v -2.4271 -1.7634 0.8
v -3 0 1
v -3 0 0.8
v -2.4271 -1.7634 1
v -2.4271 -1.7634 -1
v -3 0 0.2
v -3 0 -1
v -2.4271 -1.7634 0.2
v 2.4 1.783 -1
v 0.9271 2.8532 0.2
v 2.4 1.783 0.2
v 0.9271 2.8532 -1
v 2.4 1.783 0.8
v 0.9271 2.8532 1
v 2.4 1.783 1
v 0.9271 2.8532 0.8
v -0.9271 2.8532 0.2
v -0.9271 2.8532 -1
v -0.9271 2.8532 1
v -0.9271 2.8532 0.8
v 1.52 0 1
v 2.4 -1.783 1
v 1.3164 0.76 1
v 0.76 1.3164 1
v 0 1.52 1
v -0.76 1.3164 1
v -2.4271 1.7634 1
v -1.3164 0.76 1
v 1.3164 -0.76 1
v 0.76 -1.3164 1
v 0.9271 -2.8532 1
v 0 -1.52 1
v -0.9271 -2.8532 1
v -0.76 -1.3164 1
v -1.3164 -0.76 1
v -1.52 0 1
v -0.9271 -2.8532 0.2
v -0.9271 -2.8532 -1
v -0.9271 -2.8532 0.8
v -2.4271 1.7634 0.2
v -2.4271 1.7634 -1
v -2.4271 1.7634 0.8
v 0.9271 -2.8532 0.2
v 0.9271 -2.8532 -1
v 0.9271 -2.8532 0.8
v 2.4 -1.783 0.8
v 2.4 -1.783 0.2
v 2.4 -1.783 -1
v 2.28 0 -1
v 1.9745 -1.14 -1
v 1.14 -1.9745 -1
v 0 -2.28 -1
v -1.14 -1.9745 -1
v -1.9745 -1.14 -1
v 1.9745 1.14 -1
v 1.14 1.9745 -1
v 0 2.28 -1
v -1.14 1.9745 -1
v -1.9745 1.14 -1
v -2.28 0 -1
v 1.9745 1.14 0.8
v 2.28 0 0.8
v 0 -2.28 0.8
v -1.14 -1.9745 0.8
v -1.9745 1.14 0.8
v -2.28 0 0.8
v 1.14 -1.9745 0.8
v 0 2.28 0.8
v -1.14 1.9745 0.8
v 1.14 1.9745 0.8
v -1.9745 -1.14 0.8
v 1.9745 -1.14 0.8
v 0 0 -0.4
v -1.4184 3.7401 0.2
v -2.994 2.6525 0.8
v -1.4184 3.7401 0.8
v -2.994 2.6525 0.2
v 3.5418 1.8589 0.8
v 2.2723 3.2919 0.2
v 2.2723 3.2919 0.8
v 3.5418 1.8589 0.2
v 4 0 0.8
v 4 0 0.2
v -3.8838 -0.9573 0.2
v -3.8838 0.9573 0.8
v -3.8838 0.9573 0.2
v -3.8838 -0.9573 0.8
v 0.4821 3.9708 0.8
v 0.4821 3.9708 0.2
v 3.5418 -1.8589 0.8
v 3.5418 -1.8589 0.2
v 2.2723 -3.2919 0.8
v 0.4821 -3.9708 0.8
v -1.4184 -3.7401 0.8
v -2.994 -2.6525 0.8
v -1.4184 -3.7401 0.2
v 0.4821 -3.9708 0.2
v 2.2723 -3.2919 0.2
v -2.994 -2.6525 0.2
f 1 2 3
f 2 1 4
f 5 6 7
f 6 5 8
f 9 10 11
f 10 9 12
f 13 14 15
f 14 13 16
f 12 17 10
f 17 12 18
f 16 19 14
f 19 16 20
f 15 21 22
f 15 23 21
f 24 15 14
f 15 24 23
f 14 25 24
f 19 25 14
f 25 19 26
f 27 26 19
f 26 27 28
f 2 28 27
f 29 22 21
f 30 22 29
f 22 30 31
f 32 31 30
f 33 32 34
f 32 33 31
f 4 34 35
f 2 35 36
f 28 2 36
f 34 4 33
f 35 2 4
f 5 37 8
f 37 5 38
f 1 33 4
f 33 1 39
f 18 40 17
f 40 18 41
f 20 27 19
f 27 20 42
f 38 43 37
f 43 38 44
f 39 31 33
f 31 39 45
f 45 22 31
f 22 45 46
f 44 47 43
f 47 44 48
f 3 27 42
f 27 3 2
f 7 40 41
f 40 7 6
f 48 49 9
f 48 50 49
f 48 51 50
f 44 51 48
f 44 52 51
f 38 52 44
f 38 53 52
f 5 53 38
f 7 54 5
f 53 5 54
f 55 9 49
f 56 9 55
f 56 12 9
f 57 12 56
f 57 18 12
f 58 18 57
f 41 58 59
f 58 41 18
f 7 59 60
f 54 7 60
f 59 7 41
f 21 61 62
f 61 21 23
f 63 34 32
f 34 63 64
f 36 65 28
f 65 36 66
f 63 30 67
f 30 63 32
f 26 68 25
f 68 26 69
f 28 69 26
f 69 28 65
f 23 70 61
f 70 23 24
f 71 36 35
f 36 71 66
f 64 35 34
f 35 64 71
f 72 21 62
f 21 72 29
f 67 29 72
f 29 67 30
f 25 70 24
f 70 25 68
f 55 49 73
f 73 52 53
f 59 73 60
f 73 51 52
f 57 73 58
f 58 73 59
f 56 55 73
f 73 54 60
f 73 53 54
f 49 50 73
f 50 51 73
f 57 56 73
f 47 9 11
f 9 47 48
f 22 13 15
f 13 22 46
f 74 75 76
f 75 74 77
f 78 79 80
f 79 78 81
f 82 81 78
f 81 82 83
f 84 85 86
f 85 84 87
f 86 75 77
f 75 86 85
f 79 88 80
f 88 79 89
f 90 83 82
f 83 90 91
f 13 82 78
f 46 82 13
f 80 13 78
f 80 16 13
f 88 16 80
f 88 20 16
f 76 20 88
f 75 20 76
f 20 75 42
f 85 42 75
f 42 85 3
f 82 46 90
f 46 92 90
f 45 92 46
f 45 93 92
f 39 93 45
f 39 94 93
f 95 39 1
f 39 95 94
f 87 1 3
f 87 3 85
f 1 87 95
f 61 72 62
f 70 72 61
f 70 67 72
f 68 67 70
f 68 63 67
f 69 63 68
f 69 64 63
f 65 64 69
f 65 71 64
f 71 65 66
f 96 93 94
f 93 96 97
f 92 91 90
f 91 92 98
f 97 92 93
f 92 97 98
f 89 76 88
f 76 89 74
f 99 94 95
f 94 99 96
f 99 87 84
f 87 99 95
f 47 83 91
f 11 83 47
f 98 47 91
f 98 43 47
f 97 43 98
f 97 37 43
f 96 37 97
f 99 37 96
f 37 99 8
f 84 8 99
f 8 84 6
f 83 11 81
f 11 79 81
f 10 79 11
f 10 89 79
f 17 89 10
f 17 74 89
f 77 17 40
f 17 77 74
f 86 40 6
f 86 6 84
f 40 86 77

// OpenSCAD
// Parameters
outer_diameter_mm = 6; //[3:12:0.1]
height_mm = 2; //[1:4:0.1]
bore_diameter_mm = 0; //[0:4:0.1]
edge_chamfer_mm = 0.2; //[0:0.8:0.05]
tolerance_mm = 0.1; //[0:0.3:0.01]
overlap_mm = 0.8; //[0.5:2:0.1]
flat_depth_mm = 0.6; //[0:2:0.05]
carrier_thickness_mm = 0.6; //[0:2:0.05]
carrier_radial_margin_mm = 1.0; //[0:3:0.1]

// Magnet - complete geometry
module magnet() {
  color([0.72, 0.45, 0.2]) { // Copper color for magnet
    difference() {
      // Cylindrical magnet body with chamfers
      difference() {
        cylinder(r=outer_diameter_mm/2, h=height_mm, center=true);
        translate([0, 0, height_mm/2 - edge_chamfer_mm/2])
          cylinder(r1=outer_diameter_mm/2 + overlap_mm, r2=0, h=edge_chamfer_mm + overlap_mm, center=true);
        translate([0, 0, -height_mm/2 + edge_chamfer_mm/2])
          cylinder(r1=outer_diameter_mm/2 + overlap_mm, r2=0, h=edge_chamfer_mm + overlap_mm, center=true);
      }
      // Alignment flat
      if (flat_depth_mm > 0) {
        translate([outer_diameter_mm/2 - flat_depth_mm + outer_diameter_mm/2, 0, 0])
          cube([outer_diameter_mm, outer_diameter_mm + 2*overlap_mm, height_mm + 2*overlap_mm], center=true);
      }
      // Central bore
      if (bore_diameter_mm > 0) {
        cylinder(r=(bore_diameter_mm + tolerance_mm)/2, h=height_mm + 2*overlap_mm, center=true);
      }
    }
  }
}

// Protective sleeve/carrier disc
module carrier_disc() {
  if (carrier_thickness_mm > 0) {
    color([0.85, 0.85, 0.8]) { // Off-white for carrier
      translate([0, 0, height_mm/2 + carrier_thickness_mm/2 - overlap_mm])
        cylinder(r=outer_diameter_mm/2 + carrier_radial_margin_mm, h=carrier_thickness_mm, center=true);
    }
  }
}

// Assembly
module assembly() {
  magnet();
  carrier_disc();
}

assembly();
